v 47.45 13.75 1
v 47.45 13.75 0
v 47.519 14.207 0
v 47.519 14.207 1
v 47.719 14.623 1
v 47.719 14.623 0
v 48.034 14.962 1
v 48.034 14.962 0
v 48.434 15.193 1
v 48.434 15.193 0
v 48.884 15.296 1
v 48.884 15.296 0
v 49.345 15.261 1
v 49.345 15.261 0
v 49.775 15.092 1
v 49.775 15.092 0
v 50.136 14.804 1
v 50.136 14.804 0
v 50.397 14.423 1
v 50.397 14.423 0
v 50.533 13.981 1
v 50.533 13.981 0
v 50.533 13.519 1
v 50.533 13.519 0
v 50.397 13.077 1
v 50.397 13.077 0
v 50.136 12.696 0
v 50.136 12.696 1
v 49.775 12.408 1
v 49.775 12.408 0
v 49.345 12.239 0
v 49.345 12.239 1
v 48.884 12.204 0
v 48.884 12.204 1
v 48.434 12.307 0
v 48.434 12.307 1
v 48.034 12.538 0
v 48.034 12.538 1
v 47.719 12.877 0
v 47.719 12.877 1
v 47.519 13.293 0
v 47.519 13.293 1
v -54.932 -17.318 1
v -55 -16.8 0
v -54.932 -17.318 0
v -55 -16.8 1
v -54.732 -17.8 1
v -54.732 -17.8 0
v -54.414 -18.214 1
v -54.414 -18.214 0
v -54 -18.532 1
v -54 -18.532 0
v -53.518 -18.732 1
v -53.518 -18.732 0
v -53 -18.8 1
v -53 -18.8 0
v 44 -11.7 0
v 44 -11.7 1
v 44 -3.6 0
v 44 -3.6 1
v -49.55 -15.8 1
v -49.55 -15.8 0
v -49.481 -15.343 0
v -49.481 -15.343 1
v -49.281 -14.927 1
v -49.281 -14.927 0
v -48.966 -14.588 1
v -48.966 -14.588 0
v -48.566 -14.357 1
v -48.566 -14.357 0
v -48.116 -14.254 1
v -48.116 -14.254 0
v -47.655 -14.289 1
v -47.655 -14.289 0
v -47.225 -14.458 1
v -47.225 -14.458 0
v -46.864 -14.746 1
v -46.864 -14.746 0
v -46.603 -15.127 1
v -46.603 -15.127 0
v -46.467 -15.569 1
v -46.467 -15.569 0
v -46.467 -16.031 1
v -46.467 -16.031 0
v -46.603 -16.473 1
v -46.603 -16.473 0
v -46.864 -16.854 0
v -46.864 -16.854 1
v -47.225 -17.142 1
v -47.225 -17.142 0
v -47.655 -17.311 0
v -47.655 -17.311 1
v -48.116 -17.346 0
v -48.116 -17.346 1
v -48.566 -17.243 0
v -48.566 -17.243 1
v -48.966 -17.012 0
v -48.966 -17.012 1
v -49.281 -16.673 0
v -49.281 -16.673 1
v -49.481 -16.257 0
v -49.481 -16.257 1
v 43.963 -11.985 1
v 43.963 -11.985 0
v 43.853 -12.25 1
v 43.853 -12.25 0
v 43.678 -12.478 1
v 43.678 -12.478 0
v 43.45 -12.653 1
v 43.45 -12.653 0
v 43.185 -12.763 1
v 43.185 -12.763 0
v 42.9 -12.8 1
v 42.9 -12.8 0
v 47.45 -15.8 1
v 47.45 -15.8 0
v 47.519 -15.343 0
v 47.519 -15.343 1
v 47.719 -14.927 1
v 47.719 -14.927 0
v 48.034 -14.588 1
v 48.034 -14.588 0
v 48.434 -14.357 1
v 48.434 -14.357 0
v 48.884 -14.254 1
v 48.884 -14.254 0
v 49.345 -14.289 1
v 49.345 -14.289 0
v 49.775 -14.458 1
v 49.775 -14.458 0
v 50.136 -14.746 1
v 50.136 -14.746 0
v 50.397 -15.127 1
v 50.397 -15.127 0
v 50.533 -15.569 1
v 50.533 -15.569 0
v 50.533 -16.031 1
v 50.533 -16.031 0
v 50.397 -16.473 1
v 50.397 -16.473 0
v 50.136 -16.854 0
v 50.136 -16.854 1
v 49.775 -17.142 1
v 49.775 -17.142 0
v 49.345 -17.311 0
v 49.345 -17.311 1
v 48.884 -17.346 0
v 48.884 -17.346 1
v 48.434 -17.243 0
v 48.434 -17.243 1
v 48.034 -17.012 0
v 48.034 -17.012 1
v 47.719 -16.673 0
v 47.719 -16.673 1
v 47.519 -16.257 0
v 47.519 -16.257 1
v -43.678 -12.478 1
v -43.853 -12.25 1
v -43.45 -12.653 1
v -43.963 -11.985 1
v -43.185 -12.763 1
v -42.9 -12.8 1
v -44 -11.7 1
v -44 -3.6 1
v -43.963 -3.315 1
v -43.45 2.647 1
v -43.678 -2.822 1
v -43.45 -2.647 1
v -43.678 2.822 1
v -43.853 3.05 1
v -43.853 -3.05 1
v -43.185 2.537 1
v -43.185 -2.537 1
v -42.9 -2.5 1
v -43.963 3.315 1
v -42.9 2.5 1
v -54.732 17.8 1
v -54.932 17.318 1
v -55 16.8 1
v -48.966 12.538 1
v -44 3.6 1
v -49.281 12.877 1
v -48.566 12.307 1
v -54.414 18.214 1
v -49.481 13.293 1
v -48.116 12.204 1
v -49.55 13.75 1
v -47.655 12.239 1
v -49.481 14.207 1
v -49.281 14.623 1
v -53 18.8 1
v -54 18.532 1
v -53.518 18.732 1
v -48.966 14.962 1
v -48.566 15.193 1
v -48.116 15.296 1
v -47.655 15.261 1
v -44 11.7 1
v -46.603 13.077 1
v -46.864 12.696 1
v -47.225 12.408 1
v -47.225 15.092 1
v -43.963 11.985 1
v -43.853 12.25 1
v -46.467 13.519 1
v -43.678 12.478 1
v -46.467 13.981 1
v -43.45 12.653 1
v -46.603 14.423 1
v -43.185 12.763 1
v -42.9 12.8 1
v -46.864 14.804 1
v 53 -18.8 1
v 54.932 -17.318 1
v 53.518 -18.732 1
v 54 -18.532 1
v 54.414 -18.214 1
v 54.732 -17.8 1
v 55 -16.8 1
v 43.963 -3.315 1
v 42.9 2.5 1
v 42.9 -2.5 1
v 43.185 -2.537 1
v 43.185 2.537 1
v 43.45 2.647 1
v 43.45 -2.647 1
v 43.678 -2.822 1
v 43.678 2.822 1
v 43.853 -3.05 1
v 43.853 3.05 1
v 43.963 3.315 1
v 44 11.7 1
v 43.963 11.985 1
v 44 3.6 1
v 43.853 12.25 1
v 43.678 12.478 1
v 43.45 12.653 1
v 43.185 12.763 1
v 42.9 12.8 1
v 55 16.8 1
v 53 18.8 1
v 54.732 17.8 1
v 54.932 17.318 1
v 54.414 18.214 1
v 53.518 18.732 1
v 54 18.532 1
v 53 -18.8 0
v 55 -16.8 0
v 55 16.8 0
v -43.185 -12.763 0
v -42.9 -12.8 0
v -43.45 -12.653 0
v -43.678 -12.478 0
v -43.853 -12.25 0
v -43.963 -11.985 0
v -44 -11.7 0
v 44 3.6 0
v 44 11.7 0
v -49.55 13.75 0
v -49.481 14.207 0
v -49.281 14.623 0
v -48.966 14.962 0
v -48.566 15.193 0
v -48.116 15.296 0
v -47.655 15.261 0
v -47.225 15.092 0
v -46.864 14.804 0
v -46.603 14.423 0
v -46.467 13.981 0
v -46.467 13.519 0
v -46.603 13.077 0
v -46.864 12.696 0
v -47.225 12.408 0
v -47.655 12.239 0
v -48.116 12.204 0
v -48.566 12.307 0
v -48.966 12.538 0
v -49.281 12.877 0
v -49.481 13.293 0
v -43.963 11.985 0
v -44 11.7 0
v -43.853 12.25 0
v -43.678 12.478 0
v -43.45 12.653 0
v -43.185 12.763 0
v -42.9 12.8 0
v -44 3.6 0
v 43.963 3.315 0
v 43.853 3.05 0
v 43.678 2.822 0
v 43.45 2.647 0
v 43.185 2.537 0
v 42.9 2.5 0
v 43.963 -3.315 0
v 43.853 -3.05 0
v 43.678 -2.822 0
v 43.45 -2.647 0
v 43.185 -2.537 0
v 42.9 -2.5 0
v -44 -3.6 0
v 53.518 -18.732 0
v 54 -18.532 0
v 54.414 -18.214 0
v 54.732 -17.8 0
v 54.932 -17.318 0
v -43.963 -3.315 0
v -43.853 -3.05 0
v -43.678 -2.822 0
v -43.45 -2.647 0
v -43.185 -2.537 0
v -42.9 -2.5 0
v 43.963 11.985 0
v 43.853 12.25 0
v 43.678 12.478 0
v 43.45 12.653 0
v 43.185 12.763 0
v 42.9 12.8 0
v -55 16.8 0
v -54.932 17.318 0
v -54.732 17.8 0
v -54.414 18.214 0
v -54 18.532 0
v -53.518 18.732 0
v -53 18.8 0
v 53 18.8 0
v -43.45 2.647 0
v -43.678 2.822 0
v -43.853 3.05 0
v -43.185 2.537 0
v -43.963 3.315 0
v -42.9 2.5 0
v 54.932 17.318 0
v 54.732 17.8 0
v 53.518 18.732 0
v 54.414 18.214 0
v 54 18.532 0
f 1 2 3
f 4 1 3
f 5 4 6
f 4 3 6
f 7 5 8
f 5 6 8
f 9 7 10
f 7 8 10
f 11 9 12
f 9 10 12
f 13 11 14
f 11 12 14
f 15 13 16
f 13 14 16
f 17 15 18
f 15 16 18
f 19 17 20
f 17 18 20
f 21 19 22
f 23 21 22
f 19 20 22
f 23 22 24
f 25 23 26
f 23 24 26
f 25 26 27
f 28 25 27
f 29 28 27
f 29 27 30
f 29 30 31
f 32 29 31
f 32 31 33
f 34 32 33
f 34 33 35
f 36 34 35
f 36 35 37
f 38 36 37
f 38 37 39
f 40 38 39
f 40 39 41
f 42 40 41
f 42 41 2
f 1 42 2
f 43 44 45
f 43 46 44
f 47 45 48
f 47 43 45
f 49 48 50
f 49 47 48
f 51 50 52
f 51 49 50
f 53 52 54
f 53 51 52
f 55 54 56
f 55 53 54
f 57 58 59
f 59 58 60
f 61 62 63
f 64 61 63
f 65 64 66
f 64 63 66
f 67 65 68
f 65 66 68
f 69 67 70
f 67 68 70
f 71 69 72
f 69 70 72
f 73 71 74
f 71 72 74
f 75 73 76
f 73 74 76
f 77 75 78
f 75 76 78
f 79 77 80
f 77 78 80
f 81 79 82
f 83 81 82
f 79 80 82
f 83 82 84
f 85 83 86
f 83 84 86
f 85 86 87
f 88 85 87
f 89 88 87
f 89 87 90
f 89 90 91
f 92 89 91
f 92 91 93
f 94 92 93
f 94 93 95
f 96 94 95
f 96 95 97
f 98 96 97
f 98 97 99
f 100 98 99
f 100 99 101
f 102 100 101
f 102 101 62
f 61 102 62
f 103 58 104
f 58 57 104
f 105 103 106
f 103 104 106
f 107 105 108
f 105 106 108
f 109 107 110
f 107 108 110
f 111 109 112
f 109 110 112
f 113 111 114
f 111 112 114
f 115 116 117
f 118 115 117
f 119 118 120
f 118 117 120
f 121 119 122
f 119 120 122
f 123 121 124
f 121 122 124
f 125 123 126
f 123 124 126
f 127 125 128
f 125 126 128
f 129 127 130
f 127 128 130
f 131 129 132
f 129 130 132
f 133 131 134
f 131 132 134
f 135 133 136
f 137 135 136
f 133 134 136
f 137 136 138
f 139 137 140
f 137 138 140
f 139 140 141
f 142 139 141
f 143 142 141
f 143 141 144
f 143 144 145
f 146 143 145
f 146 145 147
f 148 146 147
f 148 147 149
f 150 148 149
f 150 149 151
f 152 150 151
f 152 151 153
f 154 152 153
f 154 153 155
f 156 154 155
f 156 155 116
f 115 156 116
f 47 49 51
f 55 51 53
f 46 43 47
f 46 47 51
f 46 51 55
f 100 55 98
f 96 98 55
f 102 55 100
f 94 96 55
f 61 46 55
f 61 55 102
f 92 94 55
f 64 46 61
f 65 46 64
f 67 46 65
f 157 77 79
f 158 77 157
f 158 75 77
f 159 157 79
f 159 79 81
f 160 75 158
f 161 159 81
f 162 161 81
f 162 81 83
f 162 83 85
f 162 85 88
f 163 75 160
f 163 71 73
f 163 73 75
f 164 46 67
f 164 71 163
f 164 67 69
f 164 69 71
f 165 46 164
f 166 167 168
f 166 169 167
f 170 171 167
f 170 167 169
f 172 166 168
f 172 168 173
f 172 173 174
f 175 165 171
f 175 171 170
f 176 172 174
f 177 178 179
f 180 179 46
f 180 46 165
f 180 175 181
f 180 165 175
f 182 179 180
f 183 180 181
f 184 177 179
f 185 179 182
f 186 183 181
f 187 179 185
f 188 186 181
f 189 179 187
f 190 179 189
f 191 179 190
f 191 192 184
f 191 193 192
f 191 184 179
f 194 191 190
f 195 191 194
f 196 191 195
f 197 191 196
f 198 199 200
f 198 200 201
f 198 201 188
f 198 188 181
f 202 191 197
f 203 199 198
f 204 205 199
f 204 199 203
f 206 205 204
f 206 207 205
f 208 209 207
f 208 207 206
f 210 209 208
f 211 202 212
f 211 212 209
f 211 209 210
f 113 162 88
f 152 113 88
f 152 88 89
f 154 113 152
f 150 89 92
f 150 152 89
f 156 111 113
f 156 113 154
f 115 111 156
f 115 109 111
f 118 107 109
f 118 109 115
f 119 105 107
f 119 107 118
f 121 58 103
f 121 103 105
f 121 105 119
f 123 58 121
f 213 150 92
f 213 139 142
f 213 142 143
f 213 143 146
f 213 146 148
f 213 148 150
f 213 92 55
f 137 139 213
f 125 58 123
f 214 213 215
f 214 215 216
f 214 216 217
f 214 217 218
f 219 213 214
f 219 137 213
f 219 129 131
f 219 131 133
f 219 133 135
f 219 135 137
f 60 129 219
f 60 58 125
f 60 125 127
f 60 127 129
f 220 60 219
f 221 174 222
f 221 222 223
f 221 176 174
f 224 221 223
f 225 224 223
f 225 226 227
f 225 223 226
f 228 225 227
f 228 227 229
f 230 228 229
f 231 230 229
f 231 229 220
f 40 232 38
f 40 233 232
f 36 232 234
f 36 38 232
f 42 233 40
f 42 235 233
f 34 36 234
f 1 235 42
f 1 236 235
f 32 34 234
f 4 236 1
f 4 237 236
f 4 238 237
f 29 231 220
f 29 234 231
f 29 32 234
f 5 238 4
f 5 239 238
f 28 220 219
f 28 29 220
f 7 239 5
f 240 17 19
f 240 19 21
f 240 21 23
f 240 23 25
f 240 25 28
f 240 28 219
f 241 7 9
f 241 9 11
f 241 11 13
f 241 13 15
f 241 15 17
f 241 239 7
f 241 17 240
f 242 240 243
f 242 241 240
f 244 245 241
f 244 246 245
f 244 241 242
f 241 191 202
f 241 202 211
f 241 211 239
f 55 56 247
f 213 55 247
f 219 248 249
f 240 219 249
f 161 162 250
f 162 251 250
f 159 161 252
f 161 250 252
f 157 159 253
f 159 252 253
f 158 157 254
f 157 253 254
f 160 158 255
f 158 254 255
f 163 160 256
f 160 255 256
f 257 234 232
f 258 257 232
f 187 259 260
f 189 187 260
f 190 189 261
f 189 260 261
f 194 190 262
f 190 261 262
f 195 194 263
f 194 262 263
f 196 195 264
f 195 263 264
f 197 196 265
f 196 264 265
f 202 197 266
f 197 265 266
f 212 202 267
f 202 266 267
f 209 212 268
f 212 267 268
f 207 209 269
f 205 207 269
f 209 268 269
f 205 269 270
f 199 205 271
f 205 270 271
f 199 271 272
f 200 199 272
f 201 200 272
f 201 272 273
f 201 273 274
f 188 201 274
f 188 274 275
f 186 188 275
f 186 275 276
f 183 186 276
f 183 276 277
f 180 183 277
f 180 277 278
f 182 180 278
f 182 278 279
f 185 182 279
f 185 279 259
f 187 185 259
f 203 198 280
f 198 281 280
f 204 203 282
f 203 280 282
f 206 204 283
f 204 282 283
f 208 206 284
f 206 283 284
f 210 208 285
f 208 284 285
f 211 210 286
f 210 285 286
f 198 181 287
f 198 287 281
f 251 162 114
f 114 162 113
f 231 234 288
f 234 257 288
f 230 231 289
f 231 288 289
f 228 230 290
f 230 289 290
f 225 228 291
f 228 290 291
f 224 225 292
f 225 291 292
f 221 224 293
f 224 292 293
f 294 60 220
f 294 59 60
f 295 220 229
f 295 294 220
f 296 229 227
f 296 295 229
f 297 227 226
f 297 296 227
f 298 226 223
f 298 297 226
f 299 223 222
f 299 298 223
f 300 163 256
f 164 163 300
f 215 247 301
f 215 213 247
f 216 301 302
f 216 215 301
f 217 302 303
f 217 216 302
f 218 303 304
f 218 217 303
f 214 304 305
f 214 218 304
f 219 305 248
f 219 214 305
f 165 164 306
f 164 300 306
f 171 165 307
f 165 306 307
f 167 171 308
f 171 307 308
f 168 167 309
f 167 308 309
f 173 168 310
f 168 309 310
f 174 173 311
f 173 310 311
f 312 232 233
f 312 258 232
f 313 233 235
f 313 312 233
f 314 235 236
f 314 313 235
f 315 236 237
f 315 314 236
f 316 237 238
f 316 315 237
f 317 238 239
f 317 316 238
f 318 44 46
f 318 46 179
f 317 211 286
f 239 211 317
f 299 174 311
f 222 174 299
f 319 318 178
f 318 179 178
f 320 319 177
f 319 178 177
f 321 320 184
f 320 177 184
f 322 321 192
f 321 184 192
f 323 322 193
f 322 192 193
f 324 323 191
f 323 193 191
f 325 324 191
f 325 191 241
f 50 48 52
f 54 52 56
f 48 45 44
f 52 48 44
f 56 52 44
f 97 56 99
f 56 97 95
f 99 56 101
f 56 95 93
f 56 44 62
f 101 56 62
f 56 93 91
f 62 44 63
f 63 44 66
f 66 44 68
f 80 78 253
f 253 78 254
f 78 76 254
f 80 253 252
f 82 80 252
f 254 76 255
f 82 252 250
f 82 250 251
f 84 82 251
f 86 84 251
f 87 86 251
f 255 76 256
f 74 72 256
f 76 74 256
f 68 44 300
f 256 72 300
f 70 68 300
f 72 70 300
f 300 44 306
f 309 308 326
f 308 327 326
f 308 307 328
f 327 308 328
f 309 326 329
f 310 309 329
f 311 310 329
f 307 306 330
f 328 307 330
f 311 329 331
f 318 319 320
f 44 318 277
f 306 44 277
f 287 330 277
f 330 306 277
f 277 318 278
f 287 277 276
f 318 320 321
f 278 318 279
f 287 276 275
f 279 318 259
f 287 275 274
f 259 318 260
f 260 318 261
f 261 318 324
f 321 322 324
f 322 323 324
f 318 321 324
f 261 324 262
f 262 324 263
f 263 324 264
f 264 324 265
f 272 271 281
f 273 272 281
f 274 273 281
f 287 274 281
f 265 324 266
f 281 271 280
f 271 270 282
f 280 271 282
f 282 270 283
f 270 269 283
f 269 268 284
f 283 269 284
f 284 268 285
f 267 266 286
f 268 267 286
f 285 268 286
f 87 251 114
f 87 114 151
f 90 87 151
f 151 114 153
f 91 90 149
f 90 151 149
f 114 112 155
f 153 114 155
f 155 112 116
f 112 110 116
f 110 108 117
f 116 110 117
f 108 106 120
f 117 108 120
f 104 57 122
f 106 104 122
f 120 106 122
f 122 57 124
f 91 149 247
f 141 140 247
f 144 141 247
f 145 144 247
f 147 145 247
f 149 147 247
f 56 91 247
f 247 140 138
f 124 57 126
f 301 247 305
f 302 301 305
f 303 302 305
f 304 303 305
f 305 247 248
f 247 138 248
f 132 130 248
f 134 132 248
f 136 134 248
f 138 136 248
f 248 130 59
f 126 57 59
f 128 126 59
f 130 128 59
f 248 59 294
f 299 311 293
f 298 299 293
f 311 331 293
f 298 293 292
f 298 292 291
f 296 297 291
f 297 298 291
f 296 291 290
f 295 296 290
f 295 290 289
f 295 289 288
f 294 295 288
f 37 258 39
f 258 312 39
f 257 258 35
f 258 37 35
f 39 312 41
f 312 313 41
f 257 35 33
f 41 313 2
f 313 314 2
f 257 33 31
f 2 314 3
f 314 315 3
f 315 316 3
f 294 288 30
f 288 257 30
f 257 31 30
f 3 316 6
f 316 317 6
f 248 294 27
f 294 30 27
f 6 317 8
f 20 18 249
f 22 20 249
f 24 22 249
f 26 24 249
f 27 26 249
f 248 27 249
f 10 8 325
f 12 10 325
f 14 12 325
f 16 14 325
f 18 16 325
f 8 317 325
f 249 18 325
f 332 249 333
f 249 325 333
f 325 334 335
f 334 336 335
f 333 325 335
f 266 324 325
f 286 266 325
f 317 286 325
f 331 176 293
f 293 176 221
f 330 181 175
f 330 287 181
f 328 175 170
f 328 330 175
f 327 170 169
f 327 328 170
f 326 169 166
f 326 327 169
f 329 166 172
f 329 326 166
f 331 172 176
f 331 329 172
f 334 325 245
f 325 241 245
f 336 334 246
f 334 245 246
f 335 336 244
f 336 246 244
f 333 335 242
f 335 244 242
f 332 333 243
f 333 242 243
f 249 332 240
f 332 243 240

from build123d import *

# Parameters (mm, degrees)
SKETCH_1_W          = 110
SKETCH_1_H          = 37.6
EXTRUDE_1_DEPTH     = 1
SKETCH_2_R          = 1.55
CUT_EXTRUDE_1_DEPTH = 10
FILLET_1_R          = 2
SKETCH_3_W          = 57.499999899
SKETCH_3_H          = 18
CUT_EXTRUDE_2_DEPTH = 10
SKETCH_4_W          = 2
SKETCH_4_H          = 18
EXTRUDE_2_DEPTH     = 1
FILLET_2_R          = 1.5
SKETCH_5_W          = 88
SKETCH_5_H          = 25.6
CUT_EXTRUDE_3_DEPTH = 10
SKETCH_6_W          = 88
SKETCH_6_H          = 5
EXTRUDE_3_DEPTH     = 1
FILLET_3_R          = 1.1


with BuildPart() as part:
    # 草图1 → 凸台-拉伸1 (new body)
    with BuildSketch(Plane.XY):
        Rectangle(SKETCH_1_W, SKETCH_1_H)
    extrude(amount=EXTRUDE_1_DEPTH)

    # 草图2 → 切除-拉伸1 (cut)
    with BuildSketch(Plane(origin=(0, 0, 0), x_dir=(-1, 0, 0), z_dir=(0, 0, -1))):
        with Locations((48, 13.75)):
            Circle(SKETCH_2_R)
        with Locations((48, -15.8)):
            Circle(SKETCH_2_R)
        with Locations((-49, -15.8)):
            Circle(SKETCH_2_R)
        with Locations((-49, 13.75)):
            Circle(SKETCH_2_R)
    extrude(amount=-CUT_EXTRUDE_1_DEPTH, mode=Mode.SUBTRACT)

    # 圆角1
    fillet_1_edges = [part.edges().sort_by_distance(p)[0] for p in [
        (55, -18.8, 0.5),
        (-55, -18.8, 0.5),
        (-55, 18.8, 0.5),
        (55, 18.8, 0.5),
    ]]
    fillet(fillet_1_edges, radius=FILLET_1_R)

    # 草图3 → 切除-拉伸2 (cut)
    with BuildSketch(Plane(origin=(0, 0, 0), x_dir=(-1, 0, 0), z_dir=(0, 0, -1))):
        with Locations((9.655484107, -3.8)):
            Rectangle(SKETCH_3_W, SKETCH_3_H)
    extrude(amount=-CUT_EXTRUDE_2_DEPTH, mode=Mode.SUBTRACT)

    # 草图4 → 凸台-拉伸2 (add)
    with BuildSketch(Plane(origin=(0, 0, 0), x_dir=(-1, 0, 0), z_dir=(0, 0, -1))):
        with Locations((-10.094515843, -3.8)):
            Rectangle(SKETCH_4_W, SKETCH_4_H)
        with Locations((-0.094515843, -3.8)):
            Rectangle(SKETCH_4_W, SKETCH_4_H)
        with Locations((9.905484157, -3.8)):
            Rectangle(SKETCH_4_W, SKETCH_4_H)
        with Locations((19.905484157, -3.8)):
            Rectangle(SKETCH_4_W, SKETCH_4_H)
        with Locations((29.905484157, -3.8)):
            Rectangle(SKETCH_4_W, SKETCH_4_H)
    extrude(amount=-EXTRUDE_2_DEPTH)

    # 圆角2
    fillet_2_edges = [part.edges().sort_by_distance(p)[0] for p in [
        (-8.905484157, -12.8, 0.5),
        (-8.905484157, 5.2, 0.5),
        (-10.905484157, 5.2, 0.5),
        (-10.905484157, -12.8, 0.5),
        (-18.905484157, -12.8, 0.5),
        (-18.905484157, 5.2, 0.5),
        (-20.905484157, 5.2, 0.5),
        (-20.905484157, -12.8, 0.5),
        (-28.905484157, -12.8, 0.5),
        (-28.905484157, 5.2, 0.5),
        (-30.905484157, 5.2, 0.5),
        (-30.905484157, -12.8, 0.5),
        (-38.405484056, 5.2, 0.5),
        (-38.405484056, -12.8, 0.5),
        (19.094515843, -12.8, 0.5),
        (19.094515843, 5.2, 0.5),
        (11.094515843, 5.2, 0.5),
        (9.094515843, 5.2, 0.5),
        (9.094515843, -12.8, 0.5),
        (11.094515843, -12.8, 0.5),
        (1.094515843, -12.8, 0.5),
        (1.094515843, 5.2, 0.5),
        (-0.905484157, 5.2, 0.5),
        (-0.905484157, -12.8, 0.5),
    ]]
    fillet(fillet_2_edges, radius=FILLET_2_R)

    # 草图5 → 切除-拉伸3 (cut)
    with BuildSketch(Plane.XY.offset(1)):
        Rectangle(SKETCH_5_W, SKETCH_5_H)
    extrude(amount=-CUT_EXTRUDE_3_DEPTH, mode=Mode.SUBTRACT)

    # 草图6 → 凸台-拉伸3 (add)
    with BuildSketch(Plane.XY.offset(1)):
        Rectangle(SKETCH_6_W, SKETCH_6_H)
    extrude(amount=-EXTRUDE_3_DEPTH)

    # 圆角3
    fillet_3_edges = [part.edges().sort_by_distance(p)[0] for p in [
        (44, -12.8, 0.5),
        (44, 12.8, 0.5),
        (-44, -12.8, 0.5),
        (-44, 12.8, 0.5),
        (-44, 2.5, 0.5),
        (-44, -2.5, 0.5),
        (44, -2.5, 0.5),
        (44, 2.5, 0.5),
    ]]
    fillet(fillet_3_edges, radius=FILLET_3_R)


solid = part.part
